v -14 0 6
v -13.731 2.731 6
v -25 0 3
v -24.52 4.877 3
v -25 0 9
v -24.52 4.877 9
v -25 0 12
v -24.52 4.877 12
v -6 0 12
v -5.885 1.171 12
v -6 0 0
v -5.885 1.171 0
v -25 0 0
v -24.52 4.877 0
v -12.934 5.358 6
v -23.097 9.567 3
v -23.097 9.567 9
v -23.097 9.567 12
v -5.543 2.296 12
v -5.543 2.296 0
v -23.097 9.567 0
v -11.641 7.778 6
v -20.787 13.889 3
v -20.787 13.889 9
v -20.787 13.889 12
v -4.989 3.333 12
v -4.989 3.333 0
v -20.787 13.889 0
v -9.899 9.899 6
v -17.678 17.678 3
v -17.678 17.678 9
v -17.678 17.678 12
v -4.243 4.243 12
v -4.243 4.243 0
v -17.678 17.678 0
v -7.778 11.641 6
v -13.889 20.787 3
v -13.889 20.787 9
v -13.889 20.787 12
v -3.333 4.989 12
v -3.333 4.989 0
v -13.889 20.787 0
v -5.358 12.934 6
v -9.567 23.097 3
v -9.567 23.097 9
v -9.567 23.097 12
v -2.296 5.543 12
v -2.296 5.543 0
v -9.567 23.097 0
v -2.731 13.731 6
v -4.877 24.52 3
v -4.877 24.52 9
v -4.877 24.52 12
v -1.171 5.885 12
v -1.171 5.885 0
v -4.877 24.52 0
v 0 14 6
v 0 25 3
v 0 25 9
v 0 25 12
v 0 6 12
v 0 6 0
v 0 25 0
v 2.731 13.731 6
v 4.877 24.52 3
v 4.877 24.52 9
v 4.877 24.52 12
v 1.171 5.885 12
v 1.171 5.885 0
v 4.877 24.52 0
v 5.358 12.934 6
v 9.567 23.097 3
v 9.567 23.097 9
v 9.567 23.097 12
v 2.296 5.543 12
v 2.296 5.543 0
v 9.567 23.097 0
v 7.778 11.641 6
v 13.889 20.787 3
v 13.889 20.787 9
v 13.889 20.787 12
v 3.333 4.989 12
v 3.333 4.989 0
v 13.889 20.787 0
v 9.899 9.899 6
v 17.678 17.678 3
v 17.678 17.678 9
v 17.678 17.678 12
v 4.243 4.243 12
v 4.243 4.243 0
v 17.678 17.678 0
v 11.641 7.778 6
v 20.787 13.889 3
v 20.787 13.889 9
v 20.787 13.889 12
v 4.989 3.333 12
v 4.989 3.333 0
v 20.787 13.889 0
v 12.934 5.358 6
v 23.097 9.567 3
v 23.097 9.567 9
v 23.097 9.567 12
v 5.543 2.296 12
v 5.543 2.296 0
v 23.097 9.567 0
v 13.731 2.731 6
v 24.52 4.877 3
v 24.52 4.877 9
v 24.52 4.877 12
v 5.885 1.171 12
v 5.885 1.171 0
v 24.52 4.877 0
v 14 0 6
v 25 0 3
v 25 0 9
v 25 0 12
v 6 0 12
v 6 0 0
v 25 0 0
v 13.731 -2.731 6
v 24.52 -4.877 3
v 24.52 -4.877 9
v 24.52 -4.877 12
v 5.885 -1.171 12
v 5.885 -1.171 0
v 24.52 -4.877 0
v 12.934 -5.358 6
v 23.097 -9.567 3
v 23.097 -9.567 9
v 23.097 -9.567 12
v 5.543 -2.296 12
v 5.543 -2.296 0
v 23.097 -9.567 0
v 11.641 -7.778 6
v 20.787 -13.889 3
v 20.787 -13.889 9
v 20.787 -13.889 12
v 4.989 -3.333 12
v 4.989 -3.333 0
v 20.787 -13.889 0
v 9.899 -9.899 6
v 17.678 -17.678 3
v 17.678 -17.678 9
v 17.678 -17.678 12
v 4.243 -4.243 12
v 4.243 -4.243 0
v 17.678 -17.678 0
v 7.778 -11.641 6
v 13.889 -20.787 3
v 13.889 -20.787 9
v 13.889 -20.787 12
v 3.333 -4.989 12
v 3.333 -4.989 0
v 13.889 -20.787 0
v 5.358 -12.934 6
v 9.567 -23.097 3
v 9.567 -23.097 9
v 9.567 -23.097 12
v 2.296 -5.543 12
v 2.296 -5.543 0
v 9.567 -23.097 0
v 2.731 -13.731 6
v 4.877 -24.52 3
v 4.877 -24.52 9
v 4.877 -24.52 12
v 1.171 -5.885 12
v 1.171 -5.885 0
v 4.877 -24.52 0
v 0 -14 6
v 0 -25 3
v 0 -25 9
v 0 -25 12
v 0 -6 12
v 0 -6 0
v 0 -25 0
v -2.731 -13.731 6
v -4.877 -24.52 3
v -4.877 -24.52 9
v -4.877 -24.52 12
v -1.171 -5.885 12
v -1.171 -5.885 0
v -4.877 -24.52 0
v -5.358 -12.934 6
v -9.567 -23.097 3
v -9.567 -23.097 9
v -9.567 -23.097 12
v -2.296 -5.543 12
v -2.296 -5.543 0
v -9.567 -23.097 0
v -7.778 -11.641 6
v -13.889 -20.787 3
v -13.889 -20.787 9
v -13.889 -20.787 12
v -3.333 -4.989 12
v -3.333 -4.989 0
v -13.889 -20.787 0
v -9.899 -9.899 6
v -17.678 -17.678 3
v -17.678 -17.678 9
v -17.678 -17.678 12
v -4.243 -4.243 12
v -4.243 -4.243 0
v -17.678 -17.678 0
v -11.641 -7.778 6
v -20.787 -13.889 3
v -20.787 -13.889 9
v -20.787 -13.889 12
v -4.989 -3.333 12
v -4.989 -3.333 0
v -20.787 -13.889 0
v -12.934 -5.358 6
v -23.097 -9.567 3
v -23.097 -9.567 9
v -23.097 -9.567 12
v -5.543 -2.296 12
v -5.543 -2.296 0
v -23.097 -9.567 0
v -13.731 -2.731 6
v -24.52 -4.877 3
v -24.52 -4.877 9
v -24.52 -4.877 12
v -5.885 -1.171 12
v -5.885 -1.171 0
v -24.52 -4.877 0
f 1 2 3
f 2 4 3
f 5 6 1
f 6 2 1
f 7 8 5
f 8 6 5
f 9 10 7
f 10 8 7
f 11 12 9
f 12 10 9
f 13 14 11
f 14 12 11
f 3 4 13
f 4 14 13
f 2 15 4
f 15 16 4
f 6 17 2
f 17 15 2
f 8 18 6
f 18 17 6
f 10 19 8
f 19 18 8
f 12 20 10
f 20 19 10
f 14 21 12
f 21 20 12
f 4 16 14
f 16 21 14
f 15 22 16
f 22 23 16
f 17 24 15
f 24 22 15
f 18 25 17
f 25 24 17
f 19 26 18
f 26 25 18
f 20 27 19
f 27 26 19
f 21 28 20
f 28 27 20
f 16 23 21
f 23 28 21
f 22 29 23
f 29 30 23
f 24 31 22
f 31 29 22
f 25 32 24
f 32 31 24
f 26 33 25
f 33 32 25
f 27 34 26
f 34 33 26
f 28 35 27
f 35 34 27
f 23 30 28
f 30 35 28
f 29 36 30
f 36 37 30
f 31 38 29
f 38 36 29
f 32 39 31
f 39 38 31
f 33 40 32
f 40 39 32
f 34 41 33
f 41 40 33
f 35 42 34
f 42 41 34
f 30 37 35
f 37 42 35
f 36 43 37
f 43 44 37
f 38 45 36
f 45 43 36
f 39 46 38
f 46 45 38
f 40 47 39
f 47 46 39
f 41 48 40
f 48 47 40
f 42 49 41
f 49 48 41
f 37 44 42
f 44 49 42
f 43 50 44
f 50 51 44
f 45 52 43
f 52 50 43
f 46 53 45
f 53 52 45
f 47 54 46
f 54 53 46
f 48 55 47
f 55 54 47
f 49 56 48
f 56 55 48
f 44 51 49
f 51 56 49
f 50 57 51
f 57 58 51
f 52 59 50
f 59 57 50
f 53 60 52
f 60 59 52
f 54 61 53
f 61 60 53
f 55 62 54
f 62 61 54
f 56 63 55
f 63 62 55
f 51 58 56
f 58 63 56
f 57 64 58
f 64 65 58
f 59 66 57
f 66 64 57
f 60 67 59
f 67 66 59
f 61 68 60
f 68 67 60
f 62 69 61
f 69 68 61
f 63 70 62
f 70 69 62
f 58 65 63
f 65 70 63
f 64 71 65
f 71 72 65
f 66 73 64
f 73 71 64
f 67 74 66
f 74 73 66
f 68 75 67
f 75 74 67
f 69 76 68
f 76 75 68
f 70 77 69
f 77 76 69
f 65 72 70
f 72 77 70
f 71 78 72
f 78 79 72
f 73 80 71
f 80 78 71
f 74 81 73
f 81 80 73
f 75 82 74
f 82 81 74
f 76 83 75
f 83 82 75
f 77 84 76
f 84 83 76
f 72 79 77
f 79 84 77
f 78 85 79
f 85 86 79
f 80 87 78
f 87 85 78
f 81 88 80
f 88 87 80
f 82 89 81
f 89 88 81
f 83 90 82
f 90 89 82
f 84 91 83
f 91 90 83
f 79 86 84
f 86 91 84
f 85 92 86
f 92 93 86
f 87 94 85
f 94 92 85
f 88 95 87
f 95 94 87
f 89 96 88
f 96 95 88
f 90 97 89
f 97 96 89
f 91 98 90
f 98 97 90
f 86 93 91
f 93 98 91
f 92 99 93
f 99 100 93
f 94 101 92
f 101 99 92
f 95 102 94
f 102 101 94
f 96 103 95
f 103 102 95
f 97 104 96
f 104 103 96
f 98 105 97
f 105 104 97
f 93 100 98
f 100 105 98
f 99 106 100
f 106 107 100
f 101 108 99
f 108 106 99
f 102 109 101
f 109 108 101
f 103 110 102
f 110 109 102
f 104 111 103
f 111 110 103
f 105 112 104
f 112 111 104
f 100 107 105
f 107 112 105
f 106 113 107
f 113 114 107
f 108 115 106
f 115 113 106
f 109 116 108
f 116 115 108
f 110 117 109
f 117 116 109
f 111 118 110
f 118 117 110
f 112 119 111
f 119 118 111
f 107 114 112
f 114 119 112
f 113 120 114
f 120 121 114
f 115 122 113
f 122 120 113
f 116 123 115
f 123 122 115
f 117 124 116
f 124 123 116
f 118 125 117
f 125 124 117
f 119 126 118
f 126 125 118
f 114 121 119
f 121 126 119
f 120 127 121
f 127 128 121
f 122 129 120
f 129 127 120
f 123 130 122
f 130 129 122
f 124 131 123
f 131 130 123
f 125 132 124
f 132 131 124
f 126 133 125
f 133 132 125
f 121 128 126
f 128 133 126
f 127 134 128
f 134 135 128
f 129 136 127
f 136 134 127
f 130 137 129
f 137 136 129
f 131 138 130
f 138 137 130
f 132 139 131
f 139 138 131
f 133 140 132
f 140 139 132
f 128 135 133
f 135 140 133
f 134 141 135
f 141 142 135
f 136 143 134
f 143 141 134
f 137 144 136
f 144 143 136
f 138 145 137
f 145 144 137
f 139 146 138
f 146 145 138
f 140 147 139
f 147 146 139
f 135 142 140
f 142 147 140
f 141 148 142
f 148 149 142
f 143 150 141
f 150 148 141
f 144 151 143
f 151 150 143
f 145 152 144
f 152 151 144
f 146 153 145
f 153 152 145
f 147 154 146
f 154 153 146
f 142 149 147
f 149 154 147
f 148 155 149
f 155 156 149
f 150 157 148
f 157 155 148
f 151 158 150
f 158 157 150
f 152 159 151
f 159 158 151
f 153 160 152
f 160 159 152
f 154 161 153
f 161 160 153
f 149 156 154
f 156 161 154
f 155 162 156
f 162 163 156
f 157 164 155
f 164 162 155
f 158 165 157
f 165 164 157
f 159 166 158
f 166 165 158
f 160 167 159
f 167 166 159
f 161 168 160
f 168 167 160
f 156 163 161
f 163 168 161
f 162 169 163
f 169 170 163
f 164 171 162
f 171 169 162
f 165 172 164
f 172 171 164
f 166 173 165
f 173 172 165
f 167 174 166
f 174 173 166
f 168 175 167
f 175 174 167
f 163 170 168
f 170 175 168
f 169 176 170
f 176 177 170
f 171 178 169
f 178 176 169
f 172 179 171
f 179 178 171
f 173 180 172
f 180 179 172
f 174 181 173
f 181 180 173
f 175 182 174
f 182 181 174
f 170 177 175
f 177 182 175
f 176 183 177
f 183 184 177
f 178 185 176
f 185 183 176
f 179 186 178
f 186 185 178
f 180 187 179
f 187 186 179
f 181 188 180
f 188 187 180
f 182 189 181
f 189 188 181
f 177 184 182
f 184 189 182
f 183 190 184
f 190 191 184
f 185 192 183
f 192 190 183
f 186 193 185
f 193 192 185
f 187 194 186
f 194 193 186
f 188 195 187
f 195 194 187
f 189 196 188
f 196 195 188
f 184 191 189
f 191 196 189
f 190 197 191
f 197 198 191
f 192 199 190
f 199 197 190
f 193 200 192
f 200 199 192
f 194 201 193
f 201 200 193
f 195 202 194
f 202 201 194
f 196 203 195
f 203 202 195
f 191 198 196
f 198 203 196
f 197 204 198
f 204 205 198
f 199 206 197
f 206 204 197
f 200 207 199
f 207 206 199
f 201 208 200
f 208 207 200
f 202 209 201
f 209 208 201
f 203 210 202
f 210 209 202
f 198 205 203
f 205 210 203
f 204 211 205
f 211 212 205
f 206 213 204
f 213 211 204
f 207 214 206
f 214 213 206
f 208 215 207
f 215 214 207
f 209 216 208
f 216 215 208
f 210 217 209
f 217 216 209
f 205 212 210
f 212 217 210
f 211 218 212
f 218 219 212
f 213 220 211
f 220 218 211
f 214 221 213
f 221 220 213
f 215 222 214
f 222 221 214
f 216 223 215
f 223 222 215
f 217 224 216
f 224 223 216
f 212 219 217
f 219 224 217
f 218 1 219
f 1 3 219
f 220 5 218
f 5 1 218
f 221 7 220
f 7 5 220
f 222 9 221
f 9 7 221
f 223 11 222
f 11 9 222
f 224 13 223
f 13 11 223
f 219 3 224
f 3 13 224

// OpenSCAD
$fn = 32;

// ----------------------------------------------------------------------
// Revolved part: V-groove pulley R25
// ----------------------------------------------------------------------

// --- parameters (mm) ---
bore_r = 6;               // bore radius
rim_r = 25;               // rim radius
rim_t = 12;               // rim width
groove_r = 14;            // groove root radius
groove_w = 3;             // groove half width
revolve_angle = 360;      // revolve sweep, degrees
fit_tol = 0.1;            // declared fit tolerance (prompt contract)
free_tol = 0.5;           // declared free tolerance (prompt contract)

bore_d = 2 * bore_r;
rim_d = 2 * rim_r;
groove_d = 2 * groove_r;

profile = [[6, 0], [25, 0], [25, 3], [14, 6], [25, 9], [25, 12], [6, 12]];  // primary outline, 7 points, counter clockwise

// --- the one profile operation ---
rotate_extrude(angle = revolve_angle) polygon(points = profile);
